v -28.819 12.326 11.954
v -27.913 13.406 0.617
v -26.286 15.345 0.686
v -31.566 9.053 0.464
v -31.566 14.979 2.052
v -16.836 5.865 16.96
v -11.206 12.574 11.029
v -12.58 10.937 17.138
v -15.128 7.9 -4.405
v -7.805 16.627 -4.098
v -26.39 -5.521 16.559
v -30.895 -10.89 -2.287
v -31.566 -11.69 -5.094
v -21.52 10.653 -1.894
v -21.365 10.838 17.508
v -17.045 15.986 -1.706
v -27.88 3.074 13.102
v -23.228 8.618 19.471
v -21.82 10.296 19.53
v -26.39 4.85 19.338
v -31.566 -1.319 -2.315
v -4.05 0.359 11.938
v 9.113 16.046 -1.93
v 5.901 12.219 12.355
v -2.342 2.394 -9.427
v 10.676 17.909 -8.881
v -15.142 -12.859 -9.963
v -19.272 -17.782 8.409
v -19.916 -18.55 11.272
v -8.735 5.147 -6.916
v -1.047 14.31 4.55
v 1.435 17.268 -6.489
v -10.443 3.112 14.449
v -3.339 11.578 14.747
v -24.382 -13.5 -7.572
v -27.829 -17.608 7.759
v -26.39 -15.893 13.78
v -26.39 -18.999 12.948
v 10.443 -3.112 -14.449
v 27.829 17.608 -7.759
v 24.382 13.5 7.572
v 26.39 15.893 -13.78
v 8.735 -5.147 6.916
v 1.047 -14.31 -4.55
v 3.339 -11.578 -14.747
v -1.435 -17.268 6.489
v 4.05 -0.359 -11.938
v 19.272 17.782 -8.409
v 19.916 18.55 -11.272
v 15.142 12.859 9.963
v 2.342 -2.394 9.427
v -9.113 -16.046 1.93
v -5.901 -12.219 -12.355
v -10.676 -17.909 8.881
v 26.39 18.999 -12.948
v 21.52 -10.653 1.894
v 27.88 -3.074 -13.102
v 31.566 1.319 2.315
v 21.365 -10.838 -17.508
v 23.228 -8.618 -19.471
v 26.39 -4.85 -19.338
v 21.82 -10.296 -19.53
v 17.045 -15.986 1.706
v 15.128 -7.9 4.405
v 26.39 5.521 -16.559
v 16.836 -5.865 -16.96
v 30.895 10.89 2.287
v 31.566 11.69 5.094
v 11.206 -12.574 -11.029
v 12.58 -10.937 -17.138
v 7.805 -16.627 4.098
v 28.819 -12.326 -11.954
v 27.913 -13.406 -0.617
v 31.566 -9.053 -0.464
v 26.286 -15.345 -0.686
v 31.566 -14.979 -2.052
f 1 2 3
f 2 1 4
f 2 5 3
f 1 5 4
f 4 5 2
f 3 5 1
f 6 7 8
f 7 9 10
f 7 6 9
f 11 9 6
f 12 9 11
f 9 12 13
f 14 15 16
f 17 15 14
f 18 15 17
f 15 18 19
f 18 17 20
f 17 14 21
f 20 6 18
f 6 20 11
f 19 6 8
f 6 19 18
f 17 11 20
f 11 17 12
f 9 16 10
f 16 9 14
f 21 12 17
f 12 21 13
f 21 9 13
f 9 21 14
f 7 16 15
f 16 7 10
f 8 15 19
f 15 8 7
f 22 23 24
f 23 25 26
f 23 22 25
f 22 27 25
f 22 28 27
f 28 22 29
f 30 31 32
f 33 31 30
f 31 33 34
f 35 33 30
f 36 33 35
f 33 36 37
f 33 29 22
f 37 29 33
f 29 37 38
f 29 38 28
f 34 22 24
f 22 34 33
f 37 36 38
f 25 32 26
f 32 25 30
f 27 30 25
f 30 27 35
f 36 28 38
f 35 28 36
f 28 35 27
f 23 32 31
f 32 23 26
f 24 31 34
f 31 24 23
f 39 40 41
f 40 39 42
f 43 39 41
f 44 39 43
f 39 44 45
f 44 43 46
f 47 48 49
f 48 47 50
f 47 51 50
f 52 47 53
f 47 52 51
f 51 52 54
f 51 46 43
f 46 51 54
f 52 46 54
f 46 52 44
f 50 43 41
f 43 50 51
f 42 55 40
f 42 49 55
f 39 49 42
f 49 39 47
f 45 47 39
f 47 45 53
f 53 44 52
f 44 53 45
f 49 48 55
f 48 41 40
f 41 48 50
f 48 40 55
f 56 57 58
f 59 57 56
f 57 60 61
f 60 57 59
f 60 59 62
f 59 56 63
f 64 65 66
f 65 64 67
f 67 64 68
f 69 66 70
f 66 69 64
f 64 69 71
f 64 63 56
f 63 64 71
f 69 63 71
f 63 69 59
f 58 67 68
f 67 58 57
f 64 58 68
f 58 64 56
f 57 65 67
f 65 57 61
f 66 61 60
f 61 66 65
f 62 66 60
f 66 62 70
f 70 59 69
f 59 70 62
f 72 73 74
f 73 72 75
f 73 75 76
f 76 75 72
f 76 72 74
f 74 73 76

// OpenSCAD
union(){
  union(){
    // slice 0
    rotate(a=[0, 0, -40])
      intersection(){
        translate(v=[-50, 0, 0])
          translate(v=[0, -500, -500])
            cube(size=[6.666666666666664, 1000, 1000]);
        rotate(a=[0, 0, 40])
          rotate(a=[15, 0, 0])
            rotate(a=[0, 15, 0])
              translate(v=[-30, -15, -10])
                cube(size=[60, 30, 20]);
      }
    // slice 2
    rotate(a=[0, 0, -40])
      intersection(){
        translate(v=[-36.666666666666664, 0, 0])
          translate(v=[0, -500, -500])
            cube(size=[6.666666666666664, 1000, 1000]);
        rotate(a=[0, 0, 40])
          rotate(a=[15, 0, 0])
            rotate(a=[0, 15, 0])
              translate(v=[-30, -15, -10])
                cube(size=[60, 30, 20]);
      }
    // slice 4
    rotate(a=[0, 0, -40])
      intersection(){
        translate(v=[-23.333333333333332, 0, 0])
          translate(v=[0, -500, -500])
            cube(size=[6.666666666666668, 1000, 1000]);
        rotate(a=[0, 0, 40])
          rotate(a=[15, 0, 0])
            rotate(a=[0, 15, 0])
              translate(v=[-30, -15, -10])
                cube(size=[60, 30, 20]);
      }
    // slice 6
    rotate(a=[0, 0, -40])
      intersection(){
        translate(v=[-10, 0, 0])
          translate(v=[0, -500, -500])
            cube(size=[6.666666666666671, 1000, 1000]);
        rotate(a=[0, 0, 40])
          rotate(a=[15, 0, 0])
            rotate(a=[0, 15, 0])
              translate(v=[-30, -15, -10])
                cube(size=[60, 30, 20]);
      }
    // slice 8
    rotate(a=[0, 0, -40])
      intersection(){
        translate(v=[3.3333333333333357, 0, 0])
          translate(v=[0, -500, -500])
            cube(size=[6.666666666666664, 1000, 1000]);
        rotate(a=[0, 0, 40])
          rotate(a=[15, 0, 0])
            rotate(a=[0, 15, 0])
              translate(v=[-30, -15, -10])
                cube(size=[60, 30, 20]);
      }
    // slice 10
    rotate(a=[0, 0, -40])
      intersection(){
        translate(v=[16.66666666666667, 0, 0])
          translate(v=[0, -500, -500])
            cube(size=[6.666666666666671, 1000, 1000]);
        rotate(a=[0, 0, 40])
          rotate(a=[15, 0, 0])
            rotate(a=[0, 15, 0])
              translate(v=[-30, -15, -10])
                cube(size=[60, 30, 20]);
      }
    // slice 12
    rotate(a=[0, 0, -40])
      intersection(){
        translate(v=[30, 0, 0])
          translate(v=[0, -500, -500])
            cube(size=[6.666666666666671, 1000, 1000]);
        rotate(a=[0, 0, 40])
          rotate(a=[15, 0, 0])
            rotate(a=[0, 15, 0])
              translate(v=[-30, -15, -10])
                cube(size=[60, 30, 20]);
      }
    // slice 14
    rotate(a=[0, 0, -40])
      intersection(){
        translate(v=[43.33333333333334, 0, 0])
          translate(v=[0, -500, -500])
            cube(size=[6.666666666666657, 1000, 1000]);
        rotate(a=[0, 0, 40])
          rotate(a=[15, 0, 0])
            rotate(a=[0, 15, 0])
              translate(v=[-30, -15, -10])
                cube(size=[60, 30, 20]);
      }
  }
  %
  translate(v=[0, 0, 10])
    union(){
      // slice 1
      rotate(a=[0, 0, -40])
        intersection(){
          translate(v=[-43.333333333333336, 0, 0])
            translate(v=[0, -500, -500])
              cube(size=[6.666666666666671, 1000, 1000]);
          rotate(a=[0, 0, 40])
            rotate(a=[15, 0, 0])
              rotate(a=[0, 15, 0])
                translate(v=[-30, -15, -10])
                  cube(size=[60, 30, 20]);
        }
      // slice 3
      rotate(a=[0, 0, -40])
        intersection(){
          translate(v=[-30, 0, 0])
            translate(v=[0, -500, -500])
              cube(size=[6.666666666666668, 1000, 1000]);
          rotate(a=[0, 0, 40])
            rotate(a=[15, 0, 0])
              rotate(a=[0, 15, 0])
                translate(v=[-30, -15, -10])
                  cube(size=[60, 30, 20]);
        }
      // slice 5
      rotate(a=[0, 0, -40])
        intersection(){
          translate(v=[-16.666666666666664, 0, 0])
            translate(v=[0, -500, -500])
              cube(size=[6.666666666666664, 1000, 1000]);
          rotate(a=[0, 0, 40])
            rotate(a=[15, 0, 0])
              rotate(a=[0, 15, 0])
                translate(v=[-30, -15, -10])
                  cube(size=[60, 30, 20]);
        }
      // slice 7
      rotate(a=[0, 0, -40])
        intersection(){
          translate(v=[-3.3333333333333286, 0, 0])
            translate(v=[0, -500, -500])
              cube(size=[6.666666666666664, 1000, 1000]);
          rotate(a=[0, 0, 40])
            rotate(a=[15, 0, 0])
              rotate(a=[0, 15, 0])
                translate(v=[-30, -15, -10])
                  cube(size=[60, 30, 20]);
        }
      // slice 9
      rotate(a=[0, 0, -40])
        intersection(){
          translate(v=[10, 0, 0])
            translate(v=[0, -500, -500])
              cube(size=[6.666666666666671, 1000, 1000]);
          rotate(a=[0, 0, 40])
            rotate(a=[15, 0, 0])
              rotate(a=[0, 15, 0])
                translate(v=[-30, -15, -10])
                  cube(size=[60, 30, 20]);
        }
      // slice 11
      rotate(a=[0, 0, -40])
        intersection(){
          translate(v=[23.333333333333343, 0, 0])
            translate(v=[0, -500, -500])
              cube(size=[6.666666666666657, 1000, 1000]);
          rotate(a=[0, 0, 40])
            rotate(a=[15, 0, 0])
              rotate(a=[0, 15, 0])
                translate(v=[-30, -15, -10])
                  cube(size=[60, 30, 20]);
        }
      // slice 13
      rotate(a=[0, 0, -40])
        intersection(){
          translate(v=[36.66666666666667, 0, 0])
            translate(v=[0, -500, -500])
              cube(size=[6.666666666666671, 1000, 1000]);
          rotate(a=[0, 0, 40])
            rotate(a=[15, 0, 0])
              rotate(a=[0, 15, 0])
                translate(v=[-30, -15, -10])
                  cube(size=[60, 30, 20]);
        }
    }
}
